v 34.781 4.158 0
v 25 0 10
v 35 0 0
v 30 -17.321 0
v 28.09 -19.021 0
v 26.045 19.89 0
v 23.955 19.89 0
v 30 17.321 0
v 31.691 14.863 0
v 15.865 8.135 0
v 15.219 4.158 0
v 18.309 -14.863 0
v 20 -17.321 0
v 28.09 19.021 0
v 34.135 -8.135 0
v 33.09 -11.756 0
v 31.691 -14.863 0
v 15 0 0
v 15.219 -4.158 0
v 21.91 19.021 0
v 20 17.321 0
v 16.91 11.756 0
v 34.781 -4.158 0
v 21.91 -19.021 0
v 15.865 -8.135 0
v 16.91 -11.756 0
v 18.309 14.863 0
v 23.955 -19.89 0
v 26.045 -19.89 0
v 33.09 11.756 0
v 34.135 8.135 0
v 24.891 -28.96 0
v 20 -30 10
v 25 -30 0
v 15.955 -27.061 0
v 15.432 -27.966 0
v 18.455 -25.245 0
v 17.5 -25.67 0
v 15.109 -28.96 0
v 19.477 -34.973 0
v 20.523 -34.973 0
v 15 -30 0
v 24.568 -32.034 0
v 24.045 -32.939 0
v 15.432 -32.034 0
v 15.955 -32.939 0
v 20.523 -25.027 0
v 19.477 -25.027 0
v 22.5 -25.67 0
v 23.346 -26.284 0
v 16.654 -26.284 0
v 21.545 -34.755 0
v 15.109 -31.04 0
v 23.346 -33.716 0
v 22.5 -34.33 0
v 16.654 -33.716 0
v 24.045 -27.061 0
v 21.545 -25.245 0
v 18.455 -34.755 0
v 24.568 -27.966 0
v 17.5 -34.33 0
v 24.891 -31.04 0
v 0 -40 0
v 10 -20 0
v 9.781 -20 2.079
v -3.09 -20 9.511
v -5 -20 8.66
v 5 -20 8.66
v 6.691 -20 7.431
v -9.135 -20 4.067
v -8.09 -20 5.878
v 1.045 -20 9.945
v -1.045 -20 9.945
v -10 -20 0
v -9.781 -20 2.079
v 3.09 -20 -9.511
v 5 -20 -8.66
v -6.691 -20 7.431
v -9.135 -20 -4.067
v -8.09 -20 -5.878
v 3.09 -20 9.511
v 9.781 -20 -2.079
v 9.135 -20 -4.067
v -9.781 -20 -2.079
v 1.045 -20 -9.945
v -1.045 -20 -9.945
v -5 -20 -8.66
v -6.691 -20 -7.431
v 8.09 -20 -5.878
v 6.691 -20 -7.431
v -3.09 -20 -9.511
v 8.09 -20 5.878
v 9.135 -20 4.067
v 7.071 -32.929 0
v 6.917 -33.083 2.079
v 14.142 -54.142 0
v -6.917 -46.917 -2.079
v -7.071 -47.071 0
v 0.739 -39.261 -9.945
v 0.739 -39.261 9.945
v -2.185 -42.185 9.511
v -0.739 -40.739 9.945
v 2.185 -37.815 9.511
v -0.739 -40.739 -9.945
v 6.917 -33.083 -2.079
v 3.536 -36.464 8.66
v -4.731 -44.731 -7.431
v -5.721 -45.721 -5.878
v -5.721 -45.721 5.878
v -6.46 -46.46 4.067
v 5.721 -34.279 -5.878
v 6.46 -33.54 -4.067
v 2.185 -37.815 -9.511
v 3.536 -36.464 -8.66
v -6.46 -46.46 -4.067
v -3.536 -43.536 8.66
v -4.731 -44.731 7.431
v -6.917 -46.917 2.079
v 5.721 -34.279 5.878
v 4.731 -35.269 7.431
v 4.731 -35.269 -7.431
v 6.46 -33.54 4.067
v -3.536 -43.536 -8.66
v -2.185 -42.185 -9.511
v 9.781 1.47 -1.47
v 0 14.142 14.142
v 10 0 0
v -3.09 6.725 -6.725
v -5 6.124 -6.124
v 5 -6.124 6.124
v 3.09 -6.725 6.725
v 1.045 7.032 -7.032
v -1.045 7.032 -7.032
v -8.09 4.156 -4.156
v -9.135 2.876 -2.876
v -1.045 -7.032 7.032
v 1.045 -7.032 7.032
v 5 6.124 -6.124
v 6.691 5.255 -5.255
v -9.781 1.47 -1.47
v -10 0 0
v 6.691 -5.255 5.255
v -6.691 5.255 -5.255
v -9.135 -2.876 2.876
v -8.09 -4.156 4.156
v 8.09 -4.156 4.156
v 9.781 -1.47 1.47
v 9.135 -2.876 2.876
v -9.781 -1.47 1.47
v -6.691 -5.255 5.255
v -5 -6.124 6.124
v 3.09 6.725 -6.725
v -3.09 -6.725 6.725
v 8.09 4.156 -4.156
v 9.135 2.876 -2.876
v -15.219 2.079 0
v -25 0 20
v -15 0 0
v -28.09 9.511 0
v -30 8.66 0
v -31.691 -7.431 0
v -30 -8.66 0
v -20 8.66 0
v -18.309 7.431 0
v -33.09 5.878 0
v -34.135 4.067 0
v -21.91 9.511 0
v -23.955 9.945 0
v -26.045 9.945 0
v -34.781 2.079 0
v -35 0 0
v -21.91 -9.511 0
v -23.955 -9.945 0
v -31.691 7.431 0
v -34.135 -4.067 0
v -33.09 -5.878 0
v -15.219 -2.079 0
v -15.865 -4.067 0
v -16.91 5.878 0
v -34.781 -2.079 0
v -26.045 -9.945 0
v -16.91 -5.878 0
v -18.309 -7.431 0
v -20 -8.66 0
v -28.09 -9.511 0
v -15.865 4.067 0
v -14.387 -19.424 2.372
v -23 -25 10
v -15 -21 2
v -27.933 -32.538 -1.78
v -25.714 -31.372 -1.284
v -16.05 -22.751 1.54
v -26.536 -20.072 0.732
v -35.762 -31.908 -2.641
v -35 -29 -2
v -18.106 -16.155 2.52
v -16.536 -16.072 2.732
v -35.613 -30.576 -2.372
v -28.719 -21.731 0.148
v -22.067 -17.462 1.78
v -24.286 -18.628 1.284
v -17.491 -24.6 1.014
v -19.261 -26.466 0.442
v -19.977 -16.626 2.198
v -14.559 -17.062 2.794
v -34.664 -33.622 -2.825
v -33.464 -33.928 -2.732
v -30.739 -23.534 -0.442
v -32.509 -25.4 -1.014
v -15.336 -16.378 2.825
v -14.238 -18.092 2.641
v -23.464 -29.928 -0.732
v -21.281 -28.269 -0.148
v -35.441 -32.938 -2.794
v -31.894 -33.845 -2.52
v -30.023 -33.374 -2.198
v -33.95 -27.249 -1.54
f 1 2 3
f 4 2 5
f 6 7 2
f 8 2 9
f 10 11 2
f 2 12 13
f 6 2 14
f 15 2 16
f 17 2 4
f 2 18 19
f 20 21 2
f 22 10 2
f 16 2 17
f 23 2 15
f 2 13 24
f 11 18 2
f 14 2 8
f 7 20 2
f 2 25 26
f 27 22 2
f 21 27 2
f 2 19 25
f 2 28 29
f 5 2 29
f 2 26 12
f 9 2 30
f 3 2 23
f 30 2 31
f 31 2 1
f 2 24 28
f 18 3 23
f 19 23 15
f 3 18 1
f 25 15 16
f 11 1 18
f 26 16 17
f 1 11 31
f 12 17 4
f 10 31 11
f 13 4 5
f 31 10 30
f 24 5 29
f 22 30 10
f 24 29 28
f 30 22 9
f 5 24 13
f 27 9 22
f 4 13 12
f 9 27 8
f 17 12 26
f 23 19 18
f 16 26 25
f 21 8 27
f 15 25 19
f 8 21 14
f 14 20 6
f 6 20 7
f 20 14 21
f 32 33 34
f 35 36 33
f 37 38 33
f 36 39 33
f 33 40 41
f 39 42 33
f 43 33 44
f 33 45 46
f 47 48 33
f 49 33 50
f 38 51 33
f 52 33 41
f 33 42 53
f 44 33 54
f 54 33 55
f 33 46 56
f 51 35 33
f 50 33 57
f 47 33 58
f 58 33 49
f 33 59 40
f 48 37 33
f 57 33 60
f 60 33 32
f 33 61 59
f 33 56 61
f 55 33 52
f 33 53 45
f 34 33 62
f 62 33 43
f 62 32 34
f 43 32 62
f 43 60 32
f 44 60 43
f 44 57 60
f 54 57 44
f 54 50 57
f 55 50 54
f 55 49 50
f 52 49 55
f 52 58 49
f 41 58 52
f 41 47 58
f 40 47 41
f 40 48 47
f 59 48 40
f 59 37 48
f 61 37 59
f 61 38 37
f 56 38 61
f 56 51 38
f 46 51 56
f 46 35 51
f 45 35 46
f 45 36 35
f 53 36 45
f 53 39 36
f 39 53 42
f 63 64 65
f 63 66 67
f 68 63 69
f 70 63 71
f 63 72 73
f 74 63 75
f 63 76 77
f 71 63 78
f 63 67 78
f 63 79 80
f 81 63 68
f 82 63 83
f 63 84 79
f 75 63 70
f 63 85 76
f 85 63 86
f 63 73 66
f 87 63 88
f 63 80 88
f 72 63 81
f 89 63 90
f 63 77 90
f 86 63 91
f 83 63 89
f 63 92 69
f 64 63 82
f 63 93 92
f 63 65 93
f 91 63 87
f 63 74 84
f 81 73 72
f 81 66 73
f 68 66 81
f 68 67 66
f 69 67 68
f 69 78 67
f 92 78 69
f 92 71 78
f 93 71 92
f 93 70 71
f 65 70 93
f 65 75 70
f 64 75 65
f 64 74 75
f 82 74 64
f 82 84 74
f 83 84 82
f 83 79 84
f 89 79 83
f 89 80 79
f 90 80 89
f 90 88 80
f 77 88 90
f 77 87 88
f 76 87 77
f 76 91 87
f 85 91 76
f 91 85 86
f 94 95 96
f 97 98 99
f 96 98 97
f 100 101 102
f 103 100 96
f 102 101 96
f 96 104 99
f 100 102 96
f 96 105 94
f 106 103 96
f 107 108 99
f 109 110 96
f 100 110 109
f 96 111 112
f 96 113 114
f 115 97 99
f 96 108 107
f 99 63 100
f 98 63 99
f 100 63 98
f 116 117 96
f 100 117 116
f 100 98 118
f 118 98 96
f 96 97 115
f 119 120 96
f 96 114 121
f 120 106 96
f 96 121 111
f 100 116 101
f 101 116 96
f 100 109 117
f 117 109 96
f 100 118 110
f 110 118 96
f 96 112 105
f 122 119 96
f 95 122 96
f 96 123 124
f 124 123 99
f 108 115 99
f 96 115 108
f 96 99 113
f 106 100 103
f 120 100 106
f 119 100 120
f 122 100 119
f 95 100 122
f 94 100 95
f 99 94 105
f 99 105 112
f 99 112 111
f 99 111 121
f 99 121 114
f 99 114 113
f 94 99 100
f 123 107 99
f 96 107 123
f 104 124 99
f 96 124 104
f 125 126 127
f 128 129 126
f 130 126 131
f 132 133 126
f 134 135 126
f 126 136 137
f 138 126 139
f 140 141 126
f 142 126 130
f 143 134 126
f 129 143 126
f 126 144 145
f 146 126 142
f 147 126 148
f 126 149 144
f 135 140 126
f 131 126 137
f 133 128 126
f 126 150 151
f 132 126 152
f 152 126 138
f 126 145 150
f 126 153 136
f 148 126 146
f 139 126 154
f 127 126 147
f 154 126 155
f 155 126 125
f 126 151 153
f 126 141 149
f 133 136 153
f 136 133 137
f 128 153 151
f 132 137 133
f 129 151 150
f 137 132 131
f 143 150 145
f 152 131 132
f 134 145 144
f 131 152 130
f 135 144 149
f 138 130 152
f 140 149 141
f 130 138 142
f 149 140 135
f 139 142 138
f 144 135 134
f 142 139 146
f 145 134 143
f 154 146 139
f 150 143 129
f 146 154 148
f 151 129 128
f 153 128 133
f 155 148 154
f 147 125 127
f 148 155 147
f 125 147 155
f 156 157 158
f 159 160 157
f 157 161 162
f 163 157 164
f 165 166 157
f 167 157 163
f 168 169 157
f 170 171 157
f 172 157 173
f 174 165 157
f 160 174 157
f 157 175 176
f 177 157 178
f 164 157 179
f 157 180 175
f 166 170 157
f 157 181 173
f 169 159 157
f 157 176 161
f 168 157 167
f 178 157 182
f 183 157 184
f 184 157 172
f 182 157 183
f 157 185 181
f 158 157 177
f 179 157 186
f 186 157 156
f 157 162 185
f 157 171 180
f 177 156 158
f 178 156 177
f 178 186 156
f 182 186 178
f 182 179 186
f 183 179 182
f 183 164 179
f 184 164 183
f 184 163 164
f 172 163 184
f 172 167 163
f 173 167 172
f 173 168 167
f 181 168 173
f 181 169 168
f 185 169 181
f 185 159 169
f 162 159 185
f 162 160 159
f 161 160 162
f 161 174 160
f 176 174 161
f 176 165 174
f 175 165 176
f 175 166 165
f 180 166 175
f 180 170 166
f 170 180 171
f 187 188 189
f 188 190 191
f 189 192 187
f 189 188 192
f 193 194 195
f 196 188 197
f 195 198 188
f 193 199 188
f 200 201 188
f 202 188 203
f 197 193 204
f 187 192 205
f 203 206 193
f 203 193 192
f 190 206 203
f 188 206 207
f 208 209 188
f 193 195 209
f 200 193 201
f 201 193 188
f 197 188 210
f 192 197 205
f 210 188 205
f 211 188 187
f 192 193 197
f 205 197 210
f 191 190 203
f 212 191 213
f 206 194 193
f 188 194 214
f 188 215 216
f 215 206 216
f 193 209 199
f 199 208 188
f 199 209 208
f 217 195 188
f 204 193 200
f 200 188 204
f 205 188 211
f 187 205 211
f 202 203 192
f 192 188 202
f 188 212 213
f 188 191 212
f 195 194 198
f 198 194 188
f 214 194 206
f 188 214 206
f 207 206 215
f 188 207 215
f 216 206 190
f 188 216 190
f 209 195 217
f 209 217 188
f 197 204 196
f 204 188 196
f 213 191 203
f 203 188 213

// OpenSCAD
module mycyl() {
  cylinder(r1=10, r2=0, h=20);
}

translate([25,0,0]) scale([1,2,0.5]) mycyl();
translate([20,-30,0]) scale(0.5) mycyl();
translate([0,-20,0]) rotate([90,0,0]) mycyl();
translate([0,-40,0]) rotate([90,0,45]) mycyl();
rotate(v=[-1,0,0], a=45) mycyl();
multmatrix([[1,0,0,-25],
            [0,1,0,0],
            [0,0,1,0],
            [0,0,0,1]]) mycyl();
multmatrix([[1,0.4,0.1,-25],
            [0.4,0.8,0,-25],
            [0.2,0.2,0.5,0],
            [0,0,0,1]]) mycyl();

//FIXME: mirror() and scale()
